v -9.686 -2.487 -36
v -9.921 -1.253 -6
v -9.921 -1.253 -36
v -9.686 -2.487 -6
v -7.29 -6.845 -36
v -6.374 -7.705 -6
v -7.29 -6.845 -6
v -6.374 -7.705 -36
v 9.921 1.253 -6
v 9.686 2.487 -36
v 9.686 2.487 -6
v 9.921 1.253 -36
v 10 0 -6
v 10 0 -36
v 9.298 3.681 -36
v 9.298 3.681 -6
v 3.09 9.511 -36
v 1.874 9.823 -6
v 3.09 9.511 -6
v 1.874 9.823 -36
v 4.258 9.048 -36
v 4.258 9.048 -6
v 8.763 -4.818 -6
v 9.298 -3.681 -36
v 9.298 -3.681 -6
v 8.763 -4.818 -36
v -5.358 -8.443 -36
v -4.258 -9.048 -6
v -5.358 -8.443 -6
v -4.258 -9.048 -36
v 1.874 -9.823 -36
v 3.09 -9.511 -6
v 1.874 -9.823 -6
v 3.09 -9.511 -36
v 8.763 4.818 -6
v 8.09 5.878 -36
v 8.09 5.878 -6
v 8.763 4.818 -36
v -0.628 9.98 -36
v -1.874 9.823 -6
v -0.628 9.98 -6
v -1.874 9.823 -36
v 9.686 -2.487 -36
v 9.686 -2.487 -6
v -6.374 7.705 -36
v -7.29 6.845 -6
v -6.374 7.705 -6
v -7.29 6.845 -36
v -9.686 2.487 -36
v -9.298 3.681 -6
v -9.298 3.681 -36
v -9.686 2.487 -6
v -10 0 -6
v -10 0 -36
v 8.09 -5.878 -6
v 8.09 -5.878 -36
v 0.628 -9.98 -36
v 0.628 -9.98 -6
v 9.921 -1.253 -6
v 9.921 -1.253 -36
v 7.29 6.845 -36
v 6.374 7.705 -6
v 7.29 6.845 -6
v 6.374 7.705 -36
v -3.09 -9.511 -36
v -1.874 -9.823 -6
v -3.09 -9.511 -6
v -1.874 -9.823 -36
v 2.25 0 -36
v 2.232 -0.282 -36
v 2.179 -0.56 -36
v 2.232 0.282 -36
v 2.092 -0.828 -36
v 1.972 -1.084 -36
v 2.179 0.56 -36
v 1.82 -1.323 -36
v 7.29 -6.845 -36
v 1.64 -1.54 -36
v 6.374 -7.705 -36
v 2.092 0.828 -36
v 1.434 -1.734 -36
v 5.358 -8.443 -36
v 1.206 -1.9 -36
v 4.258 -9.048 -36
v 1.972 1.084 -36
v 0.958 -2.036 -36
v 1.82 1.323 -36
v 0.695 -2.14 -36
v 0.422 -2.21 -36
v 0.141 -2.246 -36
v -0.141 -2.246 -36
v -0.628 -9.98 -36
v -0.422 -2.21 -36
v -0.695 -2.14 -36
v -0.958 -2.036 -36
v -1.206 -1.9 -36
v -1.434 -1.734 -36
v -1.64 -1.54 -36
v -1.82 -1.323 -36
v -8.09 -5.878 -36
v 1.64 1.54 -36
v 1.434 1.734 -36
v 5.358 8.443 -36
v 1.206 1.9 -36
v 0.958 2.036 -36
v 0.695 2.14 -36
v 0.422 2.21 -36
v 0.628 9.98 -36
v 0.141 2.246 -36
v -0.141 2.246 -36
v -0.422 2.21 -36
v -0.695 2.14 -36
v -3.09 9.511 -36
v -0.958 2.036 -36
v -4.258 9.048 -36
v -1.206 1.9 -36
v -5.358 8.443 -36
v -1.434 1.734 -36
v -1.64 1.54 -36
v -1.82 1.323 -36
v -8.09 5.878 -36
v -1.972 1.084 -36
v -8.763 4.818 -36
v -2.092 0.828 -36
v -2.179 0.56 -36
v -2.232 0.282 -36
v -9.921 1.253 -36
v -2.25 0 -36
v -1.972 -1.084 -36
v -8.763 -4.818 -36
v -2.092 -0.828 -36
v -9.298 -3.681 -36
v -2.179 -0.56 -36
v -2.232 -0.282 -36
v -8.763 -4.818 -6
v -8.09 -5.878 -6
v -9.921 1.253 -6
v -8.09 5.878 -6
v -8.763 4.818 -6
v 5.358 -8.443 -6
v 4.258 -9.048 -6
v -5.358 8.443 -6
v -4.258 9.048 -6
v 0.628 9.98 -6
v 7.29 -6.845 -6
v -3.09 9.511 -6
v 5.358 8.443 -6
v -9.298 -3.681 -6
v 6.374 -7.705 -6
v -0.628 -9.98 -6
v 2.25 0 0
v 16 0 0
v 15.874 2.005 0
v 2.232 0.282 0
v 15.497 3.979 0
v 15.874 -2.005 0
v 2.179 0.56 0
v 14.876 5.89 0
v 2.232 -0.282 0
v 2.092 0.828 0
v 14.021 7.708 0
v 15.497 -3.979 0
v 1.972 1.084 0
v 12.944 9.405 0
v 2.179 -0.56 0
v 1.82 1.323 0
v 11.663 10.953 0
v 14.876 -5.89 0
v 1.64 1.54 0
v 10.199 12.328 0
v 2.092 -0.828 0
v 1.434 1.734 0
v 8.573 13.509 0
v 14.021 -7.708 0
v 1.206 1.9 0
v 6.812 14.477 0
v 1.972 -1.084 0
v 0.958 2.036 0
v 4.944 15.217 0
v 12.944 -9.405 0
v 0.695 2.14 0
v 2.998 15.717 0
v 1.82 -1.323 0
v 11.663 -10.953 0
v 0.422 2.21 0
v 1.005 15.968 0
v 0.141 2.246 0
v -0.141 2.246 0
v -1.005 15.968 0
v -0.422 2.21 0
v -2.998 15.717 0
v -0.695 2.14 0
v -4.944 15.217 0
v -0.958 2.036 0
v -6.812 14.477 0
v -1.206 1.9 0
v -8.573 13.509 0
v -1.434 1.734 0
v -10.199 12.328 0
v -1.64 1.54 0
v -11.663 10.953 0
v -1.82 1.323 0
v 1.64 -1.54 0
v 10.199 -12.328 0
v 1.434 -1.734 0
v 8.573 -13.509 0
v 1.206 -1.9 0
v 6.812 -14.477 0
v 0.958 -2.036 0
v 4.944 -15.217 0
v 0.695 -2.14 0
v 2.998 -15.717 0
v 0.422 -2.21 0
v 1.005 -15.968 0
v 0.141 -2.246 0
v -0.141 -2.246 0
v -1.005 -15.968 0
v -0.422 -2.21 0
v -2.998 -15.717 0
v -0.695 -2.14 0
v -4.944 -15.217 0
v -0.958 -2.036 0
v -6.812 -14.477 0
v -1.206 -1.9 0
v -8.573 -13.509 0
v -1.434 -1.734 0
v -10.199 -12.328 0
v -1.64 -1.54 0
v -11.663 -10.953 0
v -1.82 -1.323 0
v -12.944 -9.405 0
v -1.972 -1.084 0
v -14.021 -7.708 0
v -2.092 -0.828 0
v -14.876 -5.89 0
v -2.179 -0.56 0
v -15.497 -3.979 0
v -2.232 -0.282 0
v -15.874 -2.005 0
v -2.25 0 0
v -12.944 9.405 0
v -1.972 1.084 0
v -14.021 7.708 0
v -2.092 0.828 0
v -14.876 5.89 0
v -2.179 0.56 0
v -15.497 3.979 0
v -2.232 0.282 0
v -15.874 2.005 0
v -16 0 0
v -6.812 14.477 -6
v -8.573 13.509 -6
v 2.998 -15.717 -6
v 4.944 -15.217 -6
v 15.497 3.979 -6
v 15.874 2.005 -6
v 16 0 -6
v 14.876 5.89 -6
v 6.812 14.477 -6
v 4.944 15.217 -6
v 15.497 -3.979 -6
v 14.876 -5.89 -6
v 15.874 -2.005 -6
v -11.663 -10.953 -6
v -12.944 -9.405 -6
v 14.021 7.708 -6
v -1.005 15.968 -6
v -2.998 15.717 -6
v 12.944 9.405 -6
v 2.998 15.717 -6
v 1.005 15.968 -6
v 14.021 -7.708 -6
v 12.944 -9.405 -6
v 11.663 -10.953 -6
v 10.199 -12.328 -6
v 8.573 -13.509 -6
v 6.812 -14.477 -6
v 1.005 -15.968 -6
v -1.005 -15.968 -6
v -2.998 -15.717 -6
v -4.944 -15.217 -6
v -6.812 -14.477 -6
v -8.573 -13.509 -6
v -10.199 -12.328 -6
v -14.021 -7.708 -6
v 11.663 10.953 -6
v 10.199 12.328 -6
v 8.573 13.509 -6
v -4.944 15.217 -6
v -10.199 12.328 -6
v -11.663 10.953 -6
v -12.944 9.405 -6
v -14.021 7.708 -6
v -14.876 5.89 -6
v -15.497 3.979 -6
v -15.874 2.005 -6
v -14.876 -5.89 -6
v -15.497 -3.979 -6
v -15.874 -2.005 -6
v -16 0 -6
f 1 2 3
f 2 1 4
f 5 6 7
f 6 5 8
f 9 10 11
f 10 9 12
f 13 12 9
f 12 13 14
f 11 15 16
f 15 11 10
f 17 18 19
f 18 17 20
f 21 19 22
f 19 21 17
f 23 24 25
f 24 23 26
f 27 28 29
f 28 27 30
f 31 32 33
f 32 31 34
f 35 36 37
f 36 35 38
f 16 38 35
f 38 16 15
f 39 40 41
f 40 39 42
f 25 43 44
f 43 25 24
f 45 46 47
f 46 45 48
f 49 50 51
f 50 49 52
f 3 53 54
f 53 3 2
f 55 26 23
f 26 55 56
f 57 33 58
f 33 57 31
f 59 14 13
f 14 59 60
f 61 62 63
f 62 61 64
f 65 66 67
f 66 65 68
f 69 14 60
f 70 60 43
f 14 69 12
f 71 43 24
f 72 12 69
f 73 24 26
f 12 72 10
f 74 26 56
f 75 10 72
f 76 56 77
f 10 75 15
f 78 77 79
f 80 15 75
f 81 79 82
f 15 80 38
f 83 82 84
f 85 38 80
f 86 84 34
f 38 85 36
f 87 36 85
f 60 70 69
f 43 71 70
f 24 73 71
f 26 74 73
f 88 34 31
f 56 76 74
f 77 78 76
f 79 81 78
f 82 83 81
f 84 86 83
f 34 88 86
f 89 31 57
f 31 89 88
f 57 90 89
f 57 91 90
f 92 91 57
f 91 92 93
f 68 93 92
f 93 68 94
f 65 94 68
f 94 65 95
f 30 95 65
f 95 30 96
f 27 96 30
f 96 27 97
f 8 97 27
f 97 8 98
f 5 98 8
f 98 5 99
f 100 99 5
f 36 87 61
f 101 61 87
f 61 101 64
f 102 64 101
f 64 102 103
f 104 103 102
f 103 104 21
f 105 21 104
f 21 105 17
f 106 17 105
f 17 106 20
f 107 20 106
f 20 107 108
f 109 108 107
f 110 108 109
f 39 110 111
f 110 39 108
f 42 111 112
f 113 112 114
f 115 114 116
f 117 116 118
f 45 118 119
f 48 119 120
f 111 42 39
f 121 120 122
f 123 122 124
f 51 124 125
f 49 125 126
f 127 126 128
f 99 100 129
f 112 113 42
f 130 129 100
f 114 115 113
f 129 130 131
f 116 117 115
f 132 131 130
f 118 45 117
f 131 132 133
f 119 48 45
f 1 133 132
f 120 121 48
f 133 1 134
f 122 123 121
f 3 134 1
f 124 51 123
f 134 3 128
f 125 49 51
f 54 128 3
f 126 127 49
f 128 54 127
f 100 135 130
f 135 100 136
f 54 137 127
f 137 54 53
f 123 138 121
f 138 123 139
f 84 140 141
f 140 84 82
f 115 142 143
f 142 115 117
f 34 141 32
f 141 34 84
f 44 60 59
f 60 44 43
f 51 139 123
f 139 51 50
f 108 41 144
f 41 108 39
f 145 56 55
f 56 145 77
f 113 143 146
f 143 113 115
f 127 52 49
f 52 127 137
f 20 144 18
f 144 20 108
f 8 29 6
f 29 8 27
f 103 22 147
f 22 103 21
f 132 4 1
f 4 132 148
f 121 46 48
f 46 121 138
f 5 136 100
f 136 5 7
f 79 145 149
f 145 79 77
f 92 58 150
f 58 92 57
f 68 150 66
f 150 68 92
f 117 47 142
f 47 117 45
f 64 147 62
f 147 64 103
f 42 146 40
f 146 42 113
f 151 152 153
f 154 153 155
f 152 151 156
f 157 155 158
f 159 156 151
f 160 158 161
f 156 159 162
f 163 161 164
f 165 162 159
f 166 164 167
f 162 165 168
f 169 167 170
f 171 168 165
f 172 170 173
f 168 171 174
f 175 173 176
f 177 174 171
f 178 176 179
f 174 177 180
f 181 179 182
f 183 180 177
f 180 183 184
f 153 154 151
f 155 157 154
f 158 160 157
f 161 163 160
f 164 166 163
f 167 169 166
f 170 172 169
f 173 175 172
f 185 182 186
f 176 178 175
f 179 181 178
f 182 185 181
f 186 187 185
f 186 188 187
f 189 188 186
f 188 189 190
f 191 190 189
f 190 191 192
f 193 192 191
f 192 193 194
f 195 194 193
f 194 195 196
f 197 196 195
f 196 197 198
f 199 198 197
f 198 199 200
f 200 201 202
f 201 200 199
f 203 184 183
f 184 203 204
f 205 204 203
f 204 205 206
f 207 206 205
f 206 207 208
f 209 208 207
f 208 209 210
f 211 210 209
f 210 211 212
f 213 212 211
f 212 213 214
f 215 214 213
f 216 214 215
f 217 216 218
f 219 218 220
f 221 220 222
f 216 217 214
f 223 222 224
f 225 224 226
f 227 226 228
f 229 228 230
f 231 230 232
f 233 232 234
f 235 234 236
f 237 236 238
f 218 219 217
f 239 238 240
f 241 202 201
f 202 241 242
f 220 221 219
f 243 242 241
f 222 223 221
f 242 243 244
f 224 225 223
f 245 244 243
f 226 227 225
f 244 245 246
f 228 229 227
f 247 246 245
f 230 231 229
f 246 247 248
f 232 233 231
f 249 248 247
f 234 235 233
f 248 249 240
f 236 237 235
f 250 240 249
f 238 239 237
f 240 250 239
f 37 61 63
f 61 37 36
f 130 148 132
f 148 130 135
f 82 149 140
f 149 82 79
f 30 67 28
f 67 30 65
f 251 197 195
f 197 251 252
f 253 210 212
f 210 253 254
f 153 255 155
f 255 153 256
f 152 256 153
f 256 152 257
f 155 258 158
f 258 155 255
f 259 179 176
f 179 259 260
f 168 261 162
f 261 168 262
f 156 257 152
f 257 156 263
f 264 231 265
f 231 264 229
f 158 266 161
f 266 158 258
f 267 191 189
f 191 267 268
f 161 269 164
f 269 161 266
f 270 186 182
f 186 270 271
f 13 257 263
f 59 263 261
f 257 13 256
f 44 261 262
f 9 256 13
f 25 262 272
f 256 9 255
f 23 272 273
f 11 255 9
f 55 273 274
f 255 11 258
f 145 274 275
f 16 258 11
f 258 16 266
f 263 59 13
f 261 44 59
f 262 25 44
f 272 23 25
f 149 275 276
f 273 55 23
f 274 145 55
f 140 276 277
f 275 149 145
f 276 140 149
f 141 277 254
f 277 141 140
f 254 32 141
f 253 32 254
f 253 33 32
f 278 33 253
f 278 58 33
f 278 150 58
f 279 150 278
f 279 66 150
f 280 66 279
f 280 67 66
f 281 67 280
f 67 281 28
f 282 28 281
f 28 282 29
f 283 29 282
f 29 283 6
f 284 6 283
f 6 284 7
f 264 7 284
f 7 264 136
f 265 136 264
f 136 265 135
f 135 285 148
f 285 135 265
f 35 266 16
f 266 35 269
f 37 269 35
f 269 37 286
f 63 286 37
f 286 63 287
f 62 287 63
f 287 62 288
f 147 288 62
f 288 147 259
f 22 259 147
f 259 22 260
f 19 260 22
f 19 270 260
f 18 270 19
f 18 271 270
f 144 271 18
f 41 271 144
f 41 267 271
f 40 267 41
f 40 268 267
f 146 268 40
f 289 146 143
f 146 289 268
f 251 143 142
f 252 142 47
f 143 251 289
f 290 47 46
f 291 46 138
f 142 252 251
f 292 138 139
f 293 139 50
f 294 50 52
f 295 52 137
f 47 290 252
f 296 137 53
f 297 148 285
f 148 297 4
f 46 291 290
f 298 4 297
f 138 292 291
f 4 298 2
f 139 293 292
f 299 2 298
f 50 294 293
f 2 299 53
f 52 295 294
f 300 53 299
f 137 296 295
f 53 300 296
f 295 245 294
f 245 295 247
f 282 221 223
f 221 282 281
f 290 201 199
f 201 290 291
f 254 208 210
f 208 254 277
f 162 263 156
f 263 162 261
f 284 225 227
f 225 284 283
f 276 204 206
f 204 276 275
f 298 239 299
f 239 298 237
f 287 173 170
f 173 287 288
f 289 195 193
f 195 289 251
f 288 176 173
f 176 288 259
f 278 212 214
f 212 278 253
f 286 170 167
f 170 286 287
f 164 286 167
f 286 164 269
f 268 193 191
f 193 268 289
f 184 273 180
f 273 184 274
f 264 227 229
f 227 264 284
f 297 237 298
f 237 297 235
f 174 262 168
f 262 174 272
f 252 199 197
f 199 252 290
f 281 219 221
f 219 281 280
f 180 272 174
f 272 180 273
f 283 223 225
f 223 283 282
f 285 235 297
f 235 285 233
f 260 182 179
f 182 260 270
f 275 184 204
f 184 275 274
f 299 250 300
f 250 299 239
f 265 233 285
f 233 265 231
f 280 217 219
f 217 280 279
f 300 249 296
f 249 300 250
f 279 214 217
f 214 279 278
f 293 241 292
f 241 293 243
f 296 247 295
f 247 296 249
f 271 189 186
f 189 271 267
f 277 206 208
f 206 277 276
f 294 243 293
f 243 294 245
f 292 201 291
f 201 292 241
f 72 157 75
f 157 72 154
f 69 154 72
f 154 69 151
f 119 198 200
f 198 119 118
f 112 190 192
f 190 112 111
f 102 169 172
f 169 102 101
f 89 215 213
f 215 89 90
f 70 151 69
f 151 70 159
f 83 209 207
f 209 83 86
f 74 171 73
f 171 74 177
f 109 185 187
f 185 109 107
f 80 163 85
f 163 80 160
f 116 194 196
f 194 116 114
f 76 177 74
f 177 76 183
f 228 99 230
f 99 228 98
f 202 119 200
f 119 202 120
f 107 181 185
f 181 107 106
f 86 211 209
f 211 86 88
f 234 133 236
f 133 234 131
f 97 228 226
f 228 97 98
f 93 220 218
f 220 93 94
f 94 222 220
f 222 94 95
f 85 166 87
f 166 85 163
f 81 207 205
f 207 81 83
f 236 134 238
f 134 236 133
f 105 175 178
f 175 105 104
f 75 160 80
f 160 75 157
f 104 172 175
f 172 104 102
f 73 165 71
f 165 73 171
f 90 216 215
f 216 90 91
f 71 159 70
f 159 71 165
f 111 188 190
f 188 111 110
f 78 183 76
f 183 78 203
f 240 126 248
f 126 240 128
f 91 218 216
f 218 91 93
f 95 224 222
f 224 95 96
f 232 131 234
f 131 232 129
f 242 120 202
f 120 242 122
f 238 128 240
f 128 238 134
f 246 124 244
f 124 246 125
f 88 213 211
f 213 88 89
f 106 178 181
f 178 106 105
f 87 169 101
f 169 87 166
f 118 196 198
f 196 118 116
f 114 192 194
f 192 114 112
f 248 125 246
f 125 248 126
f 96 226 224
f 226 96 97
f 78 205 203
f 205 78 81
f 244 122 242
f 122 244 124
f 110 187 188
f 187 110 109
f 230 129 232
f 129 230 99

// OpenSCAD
$fn = 50;


difference() {
	union() {
		translate(v = [0, 0, -36.0000000000]) {
			cylinder(h = 36, r = 10.0000000000);
		}
		translate(v = [0, 0, -6.0000000000]) {
			cylinder(h = 6, r = 16.0000000000);
		}
	}
	union() {
		#translate(v = [0, 0, -36]) {
			cylinder(h = 36, r = 2.2500000000);
		}
	}
}
